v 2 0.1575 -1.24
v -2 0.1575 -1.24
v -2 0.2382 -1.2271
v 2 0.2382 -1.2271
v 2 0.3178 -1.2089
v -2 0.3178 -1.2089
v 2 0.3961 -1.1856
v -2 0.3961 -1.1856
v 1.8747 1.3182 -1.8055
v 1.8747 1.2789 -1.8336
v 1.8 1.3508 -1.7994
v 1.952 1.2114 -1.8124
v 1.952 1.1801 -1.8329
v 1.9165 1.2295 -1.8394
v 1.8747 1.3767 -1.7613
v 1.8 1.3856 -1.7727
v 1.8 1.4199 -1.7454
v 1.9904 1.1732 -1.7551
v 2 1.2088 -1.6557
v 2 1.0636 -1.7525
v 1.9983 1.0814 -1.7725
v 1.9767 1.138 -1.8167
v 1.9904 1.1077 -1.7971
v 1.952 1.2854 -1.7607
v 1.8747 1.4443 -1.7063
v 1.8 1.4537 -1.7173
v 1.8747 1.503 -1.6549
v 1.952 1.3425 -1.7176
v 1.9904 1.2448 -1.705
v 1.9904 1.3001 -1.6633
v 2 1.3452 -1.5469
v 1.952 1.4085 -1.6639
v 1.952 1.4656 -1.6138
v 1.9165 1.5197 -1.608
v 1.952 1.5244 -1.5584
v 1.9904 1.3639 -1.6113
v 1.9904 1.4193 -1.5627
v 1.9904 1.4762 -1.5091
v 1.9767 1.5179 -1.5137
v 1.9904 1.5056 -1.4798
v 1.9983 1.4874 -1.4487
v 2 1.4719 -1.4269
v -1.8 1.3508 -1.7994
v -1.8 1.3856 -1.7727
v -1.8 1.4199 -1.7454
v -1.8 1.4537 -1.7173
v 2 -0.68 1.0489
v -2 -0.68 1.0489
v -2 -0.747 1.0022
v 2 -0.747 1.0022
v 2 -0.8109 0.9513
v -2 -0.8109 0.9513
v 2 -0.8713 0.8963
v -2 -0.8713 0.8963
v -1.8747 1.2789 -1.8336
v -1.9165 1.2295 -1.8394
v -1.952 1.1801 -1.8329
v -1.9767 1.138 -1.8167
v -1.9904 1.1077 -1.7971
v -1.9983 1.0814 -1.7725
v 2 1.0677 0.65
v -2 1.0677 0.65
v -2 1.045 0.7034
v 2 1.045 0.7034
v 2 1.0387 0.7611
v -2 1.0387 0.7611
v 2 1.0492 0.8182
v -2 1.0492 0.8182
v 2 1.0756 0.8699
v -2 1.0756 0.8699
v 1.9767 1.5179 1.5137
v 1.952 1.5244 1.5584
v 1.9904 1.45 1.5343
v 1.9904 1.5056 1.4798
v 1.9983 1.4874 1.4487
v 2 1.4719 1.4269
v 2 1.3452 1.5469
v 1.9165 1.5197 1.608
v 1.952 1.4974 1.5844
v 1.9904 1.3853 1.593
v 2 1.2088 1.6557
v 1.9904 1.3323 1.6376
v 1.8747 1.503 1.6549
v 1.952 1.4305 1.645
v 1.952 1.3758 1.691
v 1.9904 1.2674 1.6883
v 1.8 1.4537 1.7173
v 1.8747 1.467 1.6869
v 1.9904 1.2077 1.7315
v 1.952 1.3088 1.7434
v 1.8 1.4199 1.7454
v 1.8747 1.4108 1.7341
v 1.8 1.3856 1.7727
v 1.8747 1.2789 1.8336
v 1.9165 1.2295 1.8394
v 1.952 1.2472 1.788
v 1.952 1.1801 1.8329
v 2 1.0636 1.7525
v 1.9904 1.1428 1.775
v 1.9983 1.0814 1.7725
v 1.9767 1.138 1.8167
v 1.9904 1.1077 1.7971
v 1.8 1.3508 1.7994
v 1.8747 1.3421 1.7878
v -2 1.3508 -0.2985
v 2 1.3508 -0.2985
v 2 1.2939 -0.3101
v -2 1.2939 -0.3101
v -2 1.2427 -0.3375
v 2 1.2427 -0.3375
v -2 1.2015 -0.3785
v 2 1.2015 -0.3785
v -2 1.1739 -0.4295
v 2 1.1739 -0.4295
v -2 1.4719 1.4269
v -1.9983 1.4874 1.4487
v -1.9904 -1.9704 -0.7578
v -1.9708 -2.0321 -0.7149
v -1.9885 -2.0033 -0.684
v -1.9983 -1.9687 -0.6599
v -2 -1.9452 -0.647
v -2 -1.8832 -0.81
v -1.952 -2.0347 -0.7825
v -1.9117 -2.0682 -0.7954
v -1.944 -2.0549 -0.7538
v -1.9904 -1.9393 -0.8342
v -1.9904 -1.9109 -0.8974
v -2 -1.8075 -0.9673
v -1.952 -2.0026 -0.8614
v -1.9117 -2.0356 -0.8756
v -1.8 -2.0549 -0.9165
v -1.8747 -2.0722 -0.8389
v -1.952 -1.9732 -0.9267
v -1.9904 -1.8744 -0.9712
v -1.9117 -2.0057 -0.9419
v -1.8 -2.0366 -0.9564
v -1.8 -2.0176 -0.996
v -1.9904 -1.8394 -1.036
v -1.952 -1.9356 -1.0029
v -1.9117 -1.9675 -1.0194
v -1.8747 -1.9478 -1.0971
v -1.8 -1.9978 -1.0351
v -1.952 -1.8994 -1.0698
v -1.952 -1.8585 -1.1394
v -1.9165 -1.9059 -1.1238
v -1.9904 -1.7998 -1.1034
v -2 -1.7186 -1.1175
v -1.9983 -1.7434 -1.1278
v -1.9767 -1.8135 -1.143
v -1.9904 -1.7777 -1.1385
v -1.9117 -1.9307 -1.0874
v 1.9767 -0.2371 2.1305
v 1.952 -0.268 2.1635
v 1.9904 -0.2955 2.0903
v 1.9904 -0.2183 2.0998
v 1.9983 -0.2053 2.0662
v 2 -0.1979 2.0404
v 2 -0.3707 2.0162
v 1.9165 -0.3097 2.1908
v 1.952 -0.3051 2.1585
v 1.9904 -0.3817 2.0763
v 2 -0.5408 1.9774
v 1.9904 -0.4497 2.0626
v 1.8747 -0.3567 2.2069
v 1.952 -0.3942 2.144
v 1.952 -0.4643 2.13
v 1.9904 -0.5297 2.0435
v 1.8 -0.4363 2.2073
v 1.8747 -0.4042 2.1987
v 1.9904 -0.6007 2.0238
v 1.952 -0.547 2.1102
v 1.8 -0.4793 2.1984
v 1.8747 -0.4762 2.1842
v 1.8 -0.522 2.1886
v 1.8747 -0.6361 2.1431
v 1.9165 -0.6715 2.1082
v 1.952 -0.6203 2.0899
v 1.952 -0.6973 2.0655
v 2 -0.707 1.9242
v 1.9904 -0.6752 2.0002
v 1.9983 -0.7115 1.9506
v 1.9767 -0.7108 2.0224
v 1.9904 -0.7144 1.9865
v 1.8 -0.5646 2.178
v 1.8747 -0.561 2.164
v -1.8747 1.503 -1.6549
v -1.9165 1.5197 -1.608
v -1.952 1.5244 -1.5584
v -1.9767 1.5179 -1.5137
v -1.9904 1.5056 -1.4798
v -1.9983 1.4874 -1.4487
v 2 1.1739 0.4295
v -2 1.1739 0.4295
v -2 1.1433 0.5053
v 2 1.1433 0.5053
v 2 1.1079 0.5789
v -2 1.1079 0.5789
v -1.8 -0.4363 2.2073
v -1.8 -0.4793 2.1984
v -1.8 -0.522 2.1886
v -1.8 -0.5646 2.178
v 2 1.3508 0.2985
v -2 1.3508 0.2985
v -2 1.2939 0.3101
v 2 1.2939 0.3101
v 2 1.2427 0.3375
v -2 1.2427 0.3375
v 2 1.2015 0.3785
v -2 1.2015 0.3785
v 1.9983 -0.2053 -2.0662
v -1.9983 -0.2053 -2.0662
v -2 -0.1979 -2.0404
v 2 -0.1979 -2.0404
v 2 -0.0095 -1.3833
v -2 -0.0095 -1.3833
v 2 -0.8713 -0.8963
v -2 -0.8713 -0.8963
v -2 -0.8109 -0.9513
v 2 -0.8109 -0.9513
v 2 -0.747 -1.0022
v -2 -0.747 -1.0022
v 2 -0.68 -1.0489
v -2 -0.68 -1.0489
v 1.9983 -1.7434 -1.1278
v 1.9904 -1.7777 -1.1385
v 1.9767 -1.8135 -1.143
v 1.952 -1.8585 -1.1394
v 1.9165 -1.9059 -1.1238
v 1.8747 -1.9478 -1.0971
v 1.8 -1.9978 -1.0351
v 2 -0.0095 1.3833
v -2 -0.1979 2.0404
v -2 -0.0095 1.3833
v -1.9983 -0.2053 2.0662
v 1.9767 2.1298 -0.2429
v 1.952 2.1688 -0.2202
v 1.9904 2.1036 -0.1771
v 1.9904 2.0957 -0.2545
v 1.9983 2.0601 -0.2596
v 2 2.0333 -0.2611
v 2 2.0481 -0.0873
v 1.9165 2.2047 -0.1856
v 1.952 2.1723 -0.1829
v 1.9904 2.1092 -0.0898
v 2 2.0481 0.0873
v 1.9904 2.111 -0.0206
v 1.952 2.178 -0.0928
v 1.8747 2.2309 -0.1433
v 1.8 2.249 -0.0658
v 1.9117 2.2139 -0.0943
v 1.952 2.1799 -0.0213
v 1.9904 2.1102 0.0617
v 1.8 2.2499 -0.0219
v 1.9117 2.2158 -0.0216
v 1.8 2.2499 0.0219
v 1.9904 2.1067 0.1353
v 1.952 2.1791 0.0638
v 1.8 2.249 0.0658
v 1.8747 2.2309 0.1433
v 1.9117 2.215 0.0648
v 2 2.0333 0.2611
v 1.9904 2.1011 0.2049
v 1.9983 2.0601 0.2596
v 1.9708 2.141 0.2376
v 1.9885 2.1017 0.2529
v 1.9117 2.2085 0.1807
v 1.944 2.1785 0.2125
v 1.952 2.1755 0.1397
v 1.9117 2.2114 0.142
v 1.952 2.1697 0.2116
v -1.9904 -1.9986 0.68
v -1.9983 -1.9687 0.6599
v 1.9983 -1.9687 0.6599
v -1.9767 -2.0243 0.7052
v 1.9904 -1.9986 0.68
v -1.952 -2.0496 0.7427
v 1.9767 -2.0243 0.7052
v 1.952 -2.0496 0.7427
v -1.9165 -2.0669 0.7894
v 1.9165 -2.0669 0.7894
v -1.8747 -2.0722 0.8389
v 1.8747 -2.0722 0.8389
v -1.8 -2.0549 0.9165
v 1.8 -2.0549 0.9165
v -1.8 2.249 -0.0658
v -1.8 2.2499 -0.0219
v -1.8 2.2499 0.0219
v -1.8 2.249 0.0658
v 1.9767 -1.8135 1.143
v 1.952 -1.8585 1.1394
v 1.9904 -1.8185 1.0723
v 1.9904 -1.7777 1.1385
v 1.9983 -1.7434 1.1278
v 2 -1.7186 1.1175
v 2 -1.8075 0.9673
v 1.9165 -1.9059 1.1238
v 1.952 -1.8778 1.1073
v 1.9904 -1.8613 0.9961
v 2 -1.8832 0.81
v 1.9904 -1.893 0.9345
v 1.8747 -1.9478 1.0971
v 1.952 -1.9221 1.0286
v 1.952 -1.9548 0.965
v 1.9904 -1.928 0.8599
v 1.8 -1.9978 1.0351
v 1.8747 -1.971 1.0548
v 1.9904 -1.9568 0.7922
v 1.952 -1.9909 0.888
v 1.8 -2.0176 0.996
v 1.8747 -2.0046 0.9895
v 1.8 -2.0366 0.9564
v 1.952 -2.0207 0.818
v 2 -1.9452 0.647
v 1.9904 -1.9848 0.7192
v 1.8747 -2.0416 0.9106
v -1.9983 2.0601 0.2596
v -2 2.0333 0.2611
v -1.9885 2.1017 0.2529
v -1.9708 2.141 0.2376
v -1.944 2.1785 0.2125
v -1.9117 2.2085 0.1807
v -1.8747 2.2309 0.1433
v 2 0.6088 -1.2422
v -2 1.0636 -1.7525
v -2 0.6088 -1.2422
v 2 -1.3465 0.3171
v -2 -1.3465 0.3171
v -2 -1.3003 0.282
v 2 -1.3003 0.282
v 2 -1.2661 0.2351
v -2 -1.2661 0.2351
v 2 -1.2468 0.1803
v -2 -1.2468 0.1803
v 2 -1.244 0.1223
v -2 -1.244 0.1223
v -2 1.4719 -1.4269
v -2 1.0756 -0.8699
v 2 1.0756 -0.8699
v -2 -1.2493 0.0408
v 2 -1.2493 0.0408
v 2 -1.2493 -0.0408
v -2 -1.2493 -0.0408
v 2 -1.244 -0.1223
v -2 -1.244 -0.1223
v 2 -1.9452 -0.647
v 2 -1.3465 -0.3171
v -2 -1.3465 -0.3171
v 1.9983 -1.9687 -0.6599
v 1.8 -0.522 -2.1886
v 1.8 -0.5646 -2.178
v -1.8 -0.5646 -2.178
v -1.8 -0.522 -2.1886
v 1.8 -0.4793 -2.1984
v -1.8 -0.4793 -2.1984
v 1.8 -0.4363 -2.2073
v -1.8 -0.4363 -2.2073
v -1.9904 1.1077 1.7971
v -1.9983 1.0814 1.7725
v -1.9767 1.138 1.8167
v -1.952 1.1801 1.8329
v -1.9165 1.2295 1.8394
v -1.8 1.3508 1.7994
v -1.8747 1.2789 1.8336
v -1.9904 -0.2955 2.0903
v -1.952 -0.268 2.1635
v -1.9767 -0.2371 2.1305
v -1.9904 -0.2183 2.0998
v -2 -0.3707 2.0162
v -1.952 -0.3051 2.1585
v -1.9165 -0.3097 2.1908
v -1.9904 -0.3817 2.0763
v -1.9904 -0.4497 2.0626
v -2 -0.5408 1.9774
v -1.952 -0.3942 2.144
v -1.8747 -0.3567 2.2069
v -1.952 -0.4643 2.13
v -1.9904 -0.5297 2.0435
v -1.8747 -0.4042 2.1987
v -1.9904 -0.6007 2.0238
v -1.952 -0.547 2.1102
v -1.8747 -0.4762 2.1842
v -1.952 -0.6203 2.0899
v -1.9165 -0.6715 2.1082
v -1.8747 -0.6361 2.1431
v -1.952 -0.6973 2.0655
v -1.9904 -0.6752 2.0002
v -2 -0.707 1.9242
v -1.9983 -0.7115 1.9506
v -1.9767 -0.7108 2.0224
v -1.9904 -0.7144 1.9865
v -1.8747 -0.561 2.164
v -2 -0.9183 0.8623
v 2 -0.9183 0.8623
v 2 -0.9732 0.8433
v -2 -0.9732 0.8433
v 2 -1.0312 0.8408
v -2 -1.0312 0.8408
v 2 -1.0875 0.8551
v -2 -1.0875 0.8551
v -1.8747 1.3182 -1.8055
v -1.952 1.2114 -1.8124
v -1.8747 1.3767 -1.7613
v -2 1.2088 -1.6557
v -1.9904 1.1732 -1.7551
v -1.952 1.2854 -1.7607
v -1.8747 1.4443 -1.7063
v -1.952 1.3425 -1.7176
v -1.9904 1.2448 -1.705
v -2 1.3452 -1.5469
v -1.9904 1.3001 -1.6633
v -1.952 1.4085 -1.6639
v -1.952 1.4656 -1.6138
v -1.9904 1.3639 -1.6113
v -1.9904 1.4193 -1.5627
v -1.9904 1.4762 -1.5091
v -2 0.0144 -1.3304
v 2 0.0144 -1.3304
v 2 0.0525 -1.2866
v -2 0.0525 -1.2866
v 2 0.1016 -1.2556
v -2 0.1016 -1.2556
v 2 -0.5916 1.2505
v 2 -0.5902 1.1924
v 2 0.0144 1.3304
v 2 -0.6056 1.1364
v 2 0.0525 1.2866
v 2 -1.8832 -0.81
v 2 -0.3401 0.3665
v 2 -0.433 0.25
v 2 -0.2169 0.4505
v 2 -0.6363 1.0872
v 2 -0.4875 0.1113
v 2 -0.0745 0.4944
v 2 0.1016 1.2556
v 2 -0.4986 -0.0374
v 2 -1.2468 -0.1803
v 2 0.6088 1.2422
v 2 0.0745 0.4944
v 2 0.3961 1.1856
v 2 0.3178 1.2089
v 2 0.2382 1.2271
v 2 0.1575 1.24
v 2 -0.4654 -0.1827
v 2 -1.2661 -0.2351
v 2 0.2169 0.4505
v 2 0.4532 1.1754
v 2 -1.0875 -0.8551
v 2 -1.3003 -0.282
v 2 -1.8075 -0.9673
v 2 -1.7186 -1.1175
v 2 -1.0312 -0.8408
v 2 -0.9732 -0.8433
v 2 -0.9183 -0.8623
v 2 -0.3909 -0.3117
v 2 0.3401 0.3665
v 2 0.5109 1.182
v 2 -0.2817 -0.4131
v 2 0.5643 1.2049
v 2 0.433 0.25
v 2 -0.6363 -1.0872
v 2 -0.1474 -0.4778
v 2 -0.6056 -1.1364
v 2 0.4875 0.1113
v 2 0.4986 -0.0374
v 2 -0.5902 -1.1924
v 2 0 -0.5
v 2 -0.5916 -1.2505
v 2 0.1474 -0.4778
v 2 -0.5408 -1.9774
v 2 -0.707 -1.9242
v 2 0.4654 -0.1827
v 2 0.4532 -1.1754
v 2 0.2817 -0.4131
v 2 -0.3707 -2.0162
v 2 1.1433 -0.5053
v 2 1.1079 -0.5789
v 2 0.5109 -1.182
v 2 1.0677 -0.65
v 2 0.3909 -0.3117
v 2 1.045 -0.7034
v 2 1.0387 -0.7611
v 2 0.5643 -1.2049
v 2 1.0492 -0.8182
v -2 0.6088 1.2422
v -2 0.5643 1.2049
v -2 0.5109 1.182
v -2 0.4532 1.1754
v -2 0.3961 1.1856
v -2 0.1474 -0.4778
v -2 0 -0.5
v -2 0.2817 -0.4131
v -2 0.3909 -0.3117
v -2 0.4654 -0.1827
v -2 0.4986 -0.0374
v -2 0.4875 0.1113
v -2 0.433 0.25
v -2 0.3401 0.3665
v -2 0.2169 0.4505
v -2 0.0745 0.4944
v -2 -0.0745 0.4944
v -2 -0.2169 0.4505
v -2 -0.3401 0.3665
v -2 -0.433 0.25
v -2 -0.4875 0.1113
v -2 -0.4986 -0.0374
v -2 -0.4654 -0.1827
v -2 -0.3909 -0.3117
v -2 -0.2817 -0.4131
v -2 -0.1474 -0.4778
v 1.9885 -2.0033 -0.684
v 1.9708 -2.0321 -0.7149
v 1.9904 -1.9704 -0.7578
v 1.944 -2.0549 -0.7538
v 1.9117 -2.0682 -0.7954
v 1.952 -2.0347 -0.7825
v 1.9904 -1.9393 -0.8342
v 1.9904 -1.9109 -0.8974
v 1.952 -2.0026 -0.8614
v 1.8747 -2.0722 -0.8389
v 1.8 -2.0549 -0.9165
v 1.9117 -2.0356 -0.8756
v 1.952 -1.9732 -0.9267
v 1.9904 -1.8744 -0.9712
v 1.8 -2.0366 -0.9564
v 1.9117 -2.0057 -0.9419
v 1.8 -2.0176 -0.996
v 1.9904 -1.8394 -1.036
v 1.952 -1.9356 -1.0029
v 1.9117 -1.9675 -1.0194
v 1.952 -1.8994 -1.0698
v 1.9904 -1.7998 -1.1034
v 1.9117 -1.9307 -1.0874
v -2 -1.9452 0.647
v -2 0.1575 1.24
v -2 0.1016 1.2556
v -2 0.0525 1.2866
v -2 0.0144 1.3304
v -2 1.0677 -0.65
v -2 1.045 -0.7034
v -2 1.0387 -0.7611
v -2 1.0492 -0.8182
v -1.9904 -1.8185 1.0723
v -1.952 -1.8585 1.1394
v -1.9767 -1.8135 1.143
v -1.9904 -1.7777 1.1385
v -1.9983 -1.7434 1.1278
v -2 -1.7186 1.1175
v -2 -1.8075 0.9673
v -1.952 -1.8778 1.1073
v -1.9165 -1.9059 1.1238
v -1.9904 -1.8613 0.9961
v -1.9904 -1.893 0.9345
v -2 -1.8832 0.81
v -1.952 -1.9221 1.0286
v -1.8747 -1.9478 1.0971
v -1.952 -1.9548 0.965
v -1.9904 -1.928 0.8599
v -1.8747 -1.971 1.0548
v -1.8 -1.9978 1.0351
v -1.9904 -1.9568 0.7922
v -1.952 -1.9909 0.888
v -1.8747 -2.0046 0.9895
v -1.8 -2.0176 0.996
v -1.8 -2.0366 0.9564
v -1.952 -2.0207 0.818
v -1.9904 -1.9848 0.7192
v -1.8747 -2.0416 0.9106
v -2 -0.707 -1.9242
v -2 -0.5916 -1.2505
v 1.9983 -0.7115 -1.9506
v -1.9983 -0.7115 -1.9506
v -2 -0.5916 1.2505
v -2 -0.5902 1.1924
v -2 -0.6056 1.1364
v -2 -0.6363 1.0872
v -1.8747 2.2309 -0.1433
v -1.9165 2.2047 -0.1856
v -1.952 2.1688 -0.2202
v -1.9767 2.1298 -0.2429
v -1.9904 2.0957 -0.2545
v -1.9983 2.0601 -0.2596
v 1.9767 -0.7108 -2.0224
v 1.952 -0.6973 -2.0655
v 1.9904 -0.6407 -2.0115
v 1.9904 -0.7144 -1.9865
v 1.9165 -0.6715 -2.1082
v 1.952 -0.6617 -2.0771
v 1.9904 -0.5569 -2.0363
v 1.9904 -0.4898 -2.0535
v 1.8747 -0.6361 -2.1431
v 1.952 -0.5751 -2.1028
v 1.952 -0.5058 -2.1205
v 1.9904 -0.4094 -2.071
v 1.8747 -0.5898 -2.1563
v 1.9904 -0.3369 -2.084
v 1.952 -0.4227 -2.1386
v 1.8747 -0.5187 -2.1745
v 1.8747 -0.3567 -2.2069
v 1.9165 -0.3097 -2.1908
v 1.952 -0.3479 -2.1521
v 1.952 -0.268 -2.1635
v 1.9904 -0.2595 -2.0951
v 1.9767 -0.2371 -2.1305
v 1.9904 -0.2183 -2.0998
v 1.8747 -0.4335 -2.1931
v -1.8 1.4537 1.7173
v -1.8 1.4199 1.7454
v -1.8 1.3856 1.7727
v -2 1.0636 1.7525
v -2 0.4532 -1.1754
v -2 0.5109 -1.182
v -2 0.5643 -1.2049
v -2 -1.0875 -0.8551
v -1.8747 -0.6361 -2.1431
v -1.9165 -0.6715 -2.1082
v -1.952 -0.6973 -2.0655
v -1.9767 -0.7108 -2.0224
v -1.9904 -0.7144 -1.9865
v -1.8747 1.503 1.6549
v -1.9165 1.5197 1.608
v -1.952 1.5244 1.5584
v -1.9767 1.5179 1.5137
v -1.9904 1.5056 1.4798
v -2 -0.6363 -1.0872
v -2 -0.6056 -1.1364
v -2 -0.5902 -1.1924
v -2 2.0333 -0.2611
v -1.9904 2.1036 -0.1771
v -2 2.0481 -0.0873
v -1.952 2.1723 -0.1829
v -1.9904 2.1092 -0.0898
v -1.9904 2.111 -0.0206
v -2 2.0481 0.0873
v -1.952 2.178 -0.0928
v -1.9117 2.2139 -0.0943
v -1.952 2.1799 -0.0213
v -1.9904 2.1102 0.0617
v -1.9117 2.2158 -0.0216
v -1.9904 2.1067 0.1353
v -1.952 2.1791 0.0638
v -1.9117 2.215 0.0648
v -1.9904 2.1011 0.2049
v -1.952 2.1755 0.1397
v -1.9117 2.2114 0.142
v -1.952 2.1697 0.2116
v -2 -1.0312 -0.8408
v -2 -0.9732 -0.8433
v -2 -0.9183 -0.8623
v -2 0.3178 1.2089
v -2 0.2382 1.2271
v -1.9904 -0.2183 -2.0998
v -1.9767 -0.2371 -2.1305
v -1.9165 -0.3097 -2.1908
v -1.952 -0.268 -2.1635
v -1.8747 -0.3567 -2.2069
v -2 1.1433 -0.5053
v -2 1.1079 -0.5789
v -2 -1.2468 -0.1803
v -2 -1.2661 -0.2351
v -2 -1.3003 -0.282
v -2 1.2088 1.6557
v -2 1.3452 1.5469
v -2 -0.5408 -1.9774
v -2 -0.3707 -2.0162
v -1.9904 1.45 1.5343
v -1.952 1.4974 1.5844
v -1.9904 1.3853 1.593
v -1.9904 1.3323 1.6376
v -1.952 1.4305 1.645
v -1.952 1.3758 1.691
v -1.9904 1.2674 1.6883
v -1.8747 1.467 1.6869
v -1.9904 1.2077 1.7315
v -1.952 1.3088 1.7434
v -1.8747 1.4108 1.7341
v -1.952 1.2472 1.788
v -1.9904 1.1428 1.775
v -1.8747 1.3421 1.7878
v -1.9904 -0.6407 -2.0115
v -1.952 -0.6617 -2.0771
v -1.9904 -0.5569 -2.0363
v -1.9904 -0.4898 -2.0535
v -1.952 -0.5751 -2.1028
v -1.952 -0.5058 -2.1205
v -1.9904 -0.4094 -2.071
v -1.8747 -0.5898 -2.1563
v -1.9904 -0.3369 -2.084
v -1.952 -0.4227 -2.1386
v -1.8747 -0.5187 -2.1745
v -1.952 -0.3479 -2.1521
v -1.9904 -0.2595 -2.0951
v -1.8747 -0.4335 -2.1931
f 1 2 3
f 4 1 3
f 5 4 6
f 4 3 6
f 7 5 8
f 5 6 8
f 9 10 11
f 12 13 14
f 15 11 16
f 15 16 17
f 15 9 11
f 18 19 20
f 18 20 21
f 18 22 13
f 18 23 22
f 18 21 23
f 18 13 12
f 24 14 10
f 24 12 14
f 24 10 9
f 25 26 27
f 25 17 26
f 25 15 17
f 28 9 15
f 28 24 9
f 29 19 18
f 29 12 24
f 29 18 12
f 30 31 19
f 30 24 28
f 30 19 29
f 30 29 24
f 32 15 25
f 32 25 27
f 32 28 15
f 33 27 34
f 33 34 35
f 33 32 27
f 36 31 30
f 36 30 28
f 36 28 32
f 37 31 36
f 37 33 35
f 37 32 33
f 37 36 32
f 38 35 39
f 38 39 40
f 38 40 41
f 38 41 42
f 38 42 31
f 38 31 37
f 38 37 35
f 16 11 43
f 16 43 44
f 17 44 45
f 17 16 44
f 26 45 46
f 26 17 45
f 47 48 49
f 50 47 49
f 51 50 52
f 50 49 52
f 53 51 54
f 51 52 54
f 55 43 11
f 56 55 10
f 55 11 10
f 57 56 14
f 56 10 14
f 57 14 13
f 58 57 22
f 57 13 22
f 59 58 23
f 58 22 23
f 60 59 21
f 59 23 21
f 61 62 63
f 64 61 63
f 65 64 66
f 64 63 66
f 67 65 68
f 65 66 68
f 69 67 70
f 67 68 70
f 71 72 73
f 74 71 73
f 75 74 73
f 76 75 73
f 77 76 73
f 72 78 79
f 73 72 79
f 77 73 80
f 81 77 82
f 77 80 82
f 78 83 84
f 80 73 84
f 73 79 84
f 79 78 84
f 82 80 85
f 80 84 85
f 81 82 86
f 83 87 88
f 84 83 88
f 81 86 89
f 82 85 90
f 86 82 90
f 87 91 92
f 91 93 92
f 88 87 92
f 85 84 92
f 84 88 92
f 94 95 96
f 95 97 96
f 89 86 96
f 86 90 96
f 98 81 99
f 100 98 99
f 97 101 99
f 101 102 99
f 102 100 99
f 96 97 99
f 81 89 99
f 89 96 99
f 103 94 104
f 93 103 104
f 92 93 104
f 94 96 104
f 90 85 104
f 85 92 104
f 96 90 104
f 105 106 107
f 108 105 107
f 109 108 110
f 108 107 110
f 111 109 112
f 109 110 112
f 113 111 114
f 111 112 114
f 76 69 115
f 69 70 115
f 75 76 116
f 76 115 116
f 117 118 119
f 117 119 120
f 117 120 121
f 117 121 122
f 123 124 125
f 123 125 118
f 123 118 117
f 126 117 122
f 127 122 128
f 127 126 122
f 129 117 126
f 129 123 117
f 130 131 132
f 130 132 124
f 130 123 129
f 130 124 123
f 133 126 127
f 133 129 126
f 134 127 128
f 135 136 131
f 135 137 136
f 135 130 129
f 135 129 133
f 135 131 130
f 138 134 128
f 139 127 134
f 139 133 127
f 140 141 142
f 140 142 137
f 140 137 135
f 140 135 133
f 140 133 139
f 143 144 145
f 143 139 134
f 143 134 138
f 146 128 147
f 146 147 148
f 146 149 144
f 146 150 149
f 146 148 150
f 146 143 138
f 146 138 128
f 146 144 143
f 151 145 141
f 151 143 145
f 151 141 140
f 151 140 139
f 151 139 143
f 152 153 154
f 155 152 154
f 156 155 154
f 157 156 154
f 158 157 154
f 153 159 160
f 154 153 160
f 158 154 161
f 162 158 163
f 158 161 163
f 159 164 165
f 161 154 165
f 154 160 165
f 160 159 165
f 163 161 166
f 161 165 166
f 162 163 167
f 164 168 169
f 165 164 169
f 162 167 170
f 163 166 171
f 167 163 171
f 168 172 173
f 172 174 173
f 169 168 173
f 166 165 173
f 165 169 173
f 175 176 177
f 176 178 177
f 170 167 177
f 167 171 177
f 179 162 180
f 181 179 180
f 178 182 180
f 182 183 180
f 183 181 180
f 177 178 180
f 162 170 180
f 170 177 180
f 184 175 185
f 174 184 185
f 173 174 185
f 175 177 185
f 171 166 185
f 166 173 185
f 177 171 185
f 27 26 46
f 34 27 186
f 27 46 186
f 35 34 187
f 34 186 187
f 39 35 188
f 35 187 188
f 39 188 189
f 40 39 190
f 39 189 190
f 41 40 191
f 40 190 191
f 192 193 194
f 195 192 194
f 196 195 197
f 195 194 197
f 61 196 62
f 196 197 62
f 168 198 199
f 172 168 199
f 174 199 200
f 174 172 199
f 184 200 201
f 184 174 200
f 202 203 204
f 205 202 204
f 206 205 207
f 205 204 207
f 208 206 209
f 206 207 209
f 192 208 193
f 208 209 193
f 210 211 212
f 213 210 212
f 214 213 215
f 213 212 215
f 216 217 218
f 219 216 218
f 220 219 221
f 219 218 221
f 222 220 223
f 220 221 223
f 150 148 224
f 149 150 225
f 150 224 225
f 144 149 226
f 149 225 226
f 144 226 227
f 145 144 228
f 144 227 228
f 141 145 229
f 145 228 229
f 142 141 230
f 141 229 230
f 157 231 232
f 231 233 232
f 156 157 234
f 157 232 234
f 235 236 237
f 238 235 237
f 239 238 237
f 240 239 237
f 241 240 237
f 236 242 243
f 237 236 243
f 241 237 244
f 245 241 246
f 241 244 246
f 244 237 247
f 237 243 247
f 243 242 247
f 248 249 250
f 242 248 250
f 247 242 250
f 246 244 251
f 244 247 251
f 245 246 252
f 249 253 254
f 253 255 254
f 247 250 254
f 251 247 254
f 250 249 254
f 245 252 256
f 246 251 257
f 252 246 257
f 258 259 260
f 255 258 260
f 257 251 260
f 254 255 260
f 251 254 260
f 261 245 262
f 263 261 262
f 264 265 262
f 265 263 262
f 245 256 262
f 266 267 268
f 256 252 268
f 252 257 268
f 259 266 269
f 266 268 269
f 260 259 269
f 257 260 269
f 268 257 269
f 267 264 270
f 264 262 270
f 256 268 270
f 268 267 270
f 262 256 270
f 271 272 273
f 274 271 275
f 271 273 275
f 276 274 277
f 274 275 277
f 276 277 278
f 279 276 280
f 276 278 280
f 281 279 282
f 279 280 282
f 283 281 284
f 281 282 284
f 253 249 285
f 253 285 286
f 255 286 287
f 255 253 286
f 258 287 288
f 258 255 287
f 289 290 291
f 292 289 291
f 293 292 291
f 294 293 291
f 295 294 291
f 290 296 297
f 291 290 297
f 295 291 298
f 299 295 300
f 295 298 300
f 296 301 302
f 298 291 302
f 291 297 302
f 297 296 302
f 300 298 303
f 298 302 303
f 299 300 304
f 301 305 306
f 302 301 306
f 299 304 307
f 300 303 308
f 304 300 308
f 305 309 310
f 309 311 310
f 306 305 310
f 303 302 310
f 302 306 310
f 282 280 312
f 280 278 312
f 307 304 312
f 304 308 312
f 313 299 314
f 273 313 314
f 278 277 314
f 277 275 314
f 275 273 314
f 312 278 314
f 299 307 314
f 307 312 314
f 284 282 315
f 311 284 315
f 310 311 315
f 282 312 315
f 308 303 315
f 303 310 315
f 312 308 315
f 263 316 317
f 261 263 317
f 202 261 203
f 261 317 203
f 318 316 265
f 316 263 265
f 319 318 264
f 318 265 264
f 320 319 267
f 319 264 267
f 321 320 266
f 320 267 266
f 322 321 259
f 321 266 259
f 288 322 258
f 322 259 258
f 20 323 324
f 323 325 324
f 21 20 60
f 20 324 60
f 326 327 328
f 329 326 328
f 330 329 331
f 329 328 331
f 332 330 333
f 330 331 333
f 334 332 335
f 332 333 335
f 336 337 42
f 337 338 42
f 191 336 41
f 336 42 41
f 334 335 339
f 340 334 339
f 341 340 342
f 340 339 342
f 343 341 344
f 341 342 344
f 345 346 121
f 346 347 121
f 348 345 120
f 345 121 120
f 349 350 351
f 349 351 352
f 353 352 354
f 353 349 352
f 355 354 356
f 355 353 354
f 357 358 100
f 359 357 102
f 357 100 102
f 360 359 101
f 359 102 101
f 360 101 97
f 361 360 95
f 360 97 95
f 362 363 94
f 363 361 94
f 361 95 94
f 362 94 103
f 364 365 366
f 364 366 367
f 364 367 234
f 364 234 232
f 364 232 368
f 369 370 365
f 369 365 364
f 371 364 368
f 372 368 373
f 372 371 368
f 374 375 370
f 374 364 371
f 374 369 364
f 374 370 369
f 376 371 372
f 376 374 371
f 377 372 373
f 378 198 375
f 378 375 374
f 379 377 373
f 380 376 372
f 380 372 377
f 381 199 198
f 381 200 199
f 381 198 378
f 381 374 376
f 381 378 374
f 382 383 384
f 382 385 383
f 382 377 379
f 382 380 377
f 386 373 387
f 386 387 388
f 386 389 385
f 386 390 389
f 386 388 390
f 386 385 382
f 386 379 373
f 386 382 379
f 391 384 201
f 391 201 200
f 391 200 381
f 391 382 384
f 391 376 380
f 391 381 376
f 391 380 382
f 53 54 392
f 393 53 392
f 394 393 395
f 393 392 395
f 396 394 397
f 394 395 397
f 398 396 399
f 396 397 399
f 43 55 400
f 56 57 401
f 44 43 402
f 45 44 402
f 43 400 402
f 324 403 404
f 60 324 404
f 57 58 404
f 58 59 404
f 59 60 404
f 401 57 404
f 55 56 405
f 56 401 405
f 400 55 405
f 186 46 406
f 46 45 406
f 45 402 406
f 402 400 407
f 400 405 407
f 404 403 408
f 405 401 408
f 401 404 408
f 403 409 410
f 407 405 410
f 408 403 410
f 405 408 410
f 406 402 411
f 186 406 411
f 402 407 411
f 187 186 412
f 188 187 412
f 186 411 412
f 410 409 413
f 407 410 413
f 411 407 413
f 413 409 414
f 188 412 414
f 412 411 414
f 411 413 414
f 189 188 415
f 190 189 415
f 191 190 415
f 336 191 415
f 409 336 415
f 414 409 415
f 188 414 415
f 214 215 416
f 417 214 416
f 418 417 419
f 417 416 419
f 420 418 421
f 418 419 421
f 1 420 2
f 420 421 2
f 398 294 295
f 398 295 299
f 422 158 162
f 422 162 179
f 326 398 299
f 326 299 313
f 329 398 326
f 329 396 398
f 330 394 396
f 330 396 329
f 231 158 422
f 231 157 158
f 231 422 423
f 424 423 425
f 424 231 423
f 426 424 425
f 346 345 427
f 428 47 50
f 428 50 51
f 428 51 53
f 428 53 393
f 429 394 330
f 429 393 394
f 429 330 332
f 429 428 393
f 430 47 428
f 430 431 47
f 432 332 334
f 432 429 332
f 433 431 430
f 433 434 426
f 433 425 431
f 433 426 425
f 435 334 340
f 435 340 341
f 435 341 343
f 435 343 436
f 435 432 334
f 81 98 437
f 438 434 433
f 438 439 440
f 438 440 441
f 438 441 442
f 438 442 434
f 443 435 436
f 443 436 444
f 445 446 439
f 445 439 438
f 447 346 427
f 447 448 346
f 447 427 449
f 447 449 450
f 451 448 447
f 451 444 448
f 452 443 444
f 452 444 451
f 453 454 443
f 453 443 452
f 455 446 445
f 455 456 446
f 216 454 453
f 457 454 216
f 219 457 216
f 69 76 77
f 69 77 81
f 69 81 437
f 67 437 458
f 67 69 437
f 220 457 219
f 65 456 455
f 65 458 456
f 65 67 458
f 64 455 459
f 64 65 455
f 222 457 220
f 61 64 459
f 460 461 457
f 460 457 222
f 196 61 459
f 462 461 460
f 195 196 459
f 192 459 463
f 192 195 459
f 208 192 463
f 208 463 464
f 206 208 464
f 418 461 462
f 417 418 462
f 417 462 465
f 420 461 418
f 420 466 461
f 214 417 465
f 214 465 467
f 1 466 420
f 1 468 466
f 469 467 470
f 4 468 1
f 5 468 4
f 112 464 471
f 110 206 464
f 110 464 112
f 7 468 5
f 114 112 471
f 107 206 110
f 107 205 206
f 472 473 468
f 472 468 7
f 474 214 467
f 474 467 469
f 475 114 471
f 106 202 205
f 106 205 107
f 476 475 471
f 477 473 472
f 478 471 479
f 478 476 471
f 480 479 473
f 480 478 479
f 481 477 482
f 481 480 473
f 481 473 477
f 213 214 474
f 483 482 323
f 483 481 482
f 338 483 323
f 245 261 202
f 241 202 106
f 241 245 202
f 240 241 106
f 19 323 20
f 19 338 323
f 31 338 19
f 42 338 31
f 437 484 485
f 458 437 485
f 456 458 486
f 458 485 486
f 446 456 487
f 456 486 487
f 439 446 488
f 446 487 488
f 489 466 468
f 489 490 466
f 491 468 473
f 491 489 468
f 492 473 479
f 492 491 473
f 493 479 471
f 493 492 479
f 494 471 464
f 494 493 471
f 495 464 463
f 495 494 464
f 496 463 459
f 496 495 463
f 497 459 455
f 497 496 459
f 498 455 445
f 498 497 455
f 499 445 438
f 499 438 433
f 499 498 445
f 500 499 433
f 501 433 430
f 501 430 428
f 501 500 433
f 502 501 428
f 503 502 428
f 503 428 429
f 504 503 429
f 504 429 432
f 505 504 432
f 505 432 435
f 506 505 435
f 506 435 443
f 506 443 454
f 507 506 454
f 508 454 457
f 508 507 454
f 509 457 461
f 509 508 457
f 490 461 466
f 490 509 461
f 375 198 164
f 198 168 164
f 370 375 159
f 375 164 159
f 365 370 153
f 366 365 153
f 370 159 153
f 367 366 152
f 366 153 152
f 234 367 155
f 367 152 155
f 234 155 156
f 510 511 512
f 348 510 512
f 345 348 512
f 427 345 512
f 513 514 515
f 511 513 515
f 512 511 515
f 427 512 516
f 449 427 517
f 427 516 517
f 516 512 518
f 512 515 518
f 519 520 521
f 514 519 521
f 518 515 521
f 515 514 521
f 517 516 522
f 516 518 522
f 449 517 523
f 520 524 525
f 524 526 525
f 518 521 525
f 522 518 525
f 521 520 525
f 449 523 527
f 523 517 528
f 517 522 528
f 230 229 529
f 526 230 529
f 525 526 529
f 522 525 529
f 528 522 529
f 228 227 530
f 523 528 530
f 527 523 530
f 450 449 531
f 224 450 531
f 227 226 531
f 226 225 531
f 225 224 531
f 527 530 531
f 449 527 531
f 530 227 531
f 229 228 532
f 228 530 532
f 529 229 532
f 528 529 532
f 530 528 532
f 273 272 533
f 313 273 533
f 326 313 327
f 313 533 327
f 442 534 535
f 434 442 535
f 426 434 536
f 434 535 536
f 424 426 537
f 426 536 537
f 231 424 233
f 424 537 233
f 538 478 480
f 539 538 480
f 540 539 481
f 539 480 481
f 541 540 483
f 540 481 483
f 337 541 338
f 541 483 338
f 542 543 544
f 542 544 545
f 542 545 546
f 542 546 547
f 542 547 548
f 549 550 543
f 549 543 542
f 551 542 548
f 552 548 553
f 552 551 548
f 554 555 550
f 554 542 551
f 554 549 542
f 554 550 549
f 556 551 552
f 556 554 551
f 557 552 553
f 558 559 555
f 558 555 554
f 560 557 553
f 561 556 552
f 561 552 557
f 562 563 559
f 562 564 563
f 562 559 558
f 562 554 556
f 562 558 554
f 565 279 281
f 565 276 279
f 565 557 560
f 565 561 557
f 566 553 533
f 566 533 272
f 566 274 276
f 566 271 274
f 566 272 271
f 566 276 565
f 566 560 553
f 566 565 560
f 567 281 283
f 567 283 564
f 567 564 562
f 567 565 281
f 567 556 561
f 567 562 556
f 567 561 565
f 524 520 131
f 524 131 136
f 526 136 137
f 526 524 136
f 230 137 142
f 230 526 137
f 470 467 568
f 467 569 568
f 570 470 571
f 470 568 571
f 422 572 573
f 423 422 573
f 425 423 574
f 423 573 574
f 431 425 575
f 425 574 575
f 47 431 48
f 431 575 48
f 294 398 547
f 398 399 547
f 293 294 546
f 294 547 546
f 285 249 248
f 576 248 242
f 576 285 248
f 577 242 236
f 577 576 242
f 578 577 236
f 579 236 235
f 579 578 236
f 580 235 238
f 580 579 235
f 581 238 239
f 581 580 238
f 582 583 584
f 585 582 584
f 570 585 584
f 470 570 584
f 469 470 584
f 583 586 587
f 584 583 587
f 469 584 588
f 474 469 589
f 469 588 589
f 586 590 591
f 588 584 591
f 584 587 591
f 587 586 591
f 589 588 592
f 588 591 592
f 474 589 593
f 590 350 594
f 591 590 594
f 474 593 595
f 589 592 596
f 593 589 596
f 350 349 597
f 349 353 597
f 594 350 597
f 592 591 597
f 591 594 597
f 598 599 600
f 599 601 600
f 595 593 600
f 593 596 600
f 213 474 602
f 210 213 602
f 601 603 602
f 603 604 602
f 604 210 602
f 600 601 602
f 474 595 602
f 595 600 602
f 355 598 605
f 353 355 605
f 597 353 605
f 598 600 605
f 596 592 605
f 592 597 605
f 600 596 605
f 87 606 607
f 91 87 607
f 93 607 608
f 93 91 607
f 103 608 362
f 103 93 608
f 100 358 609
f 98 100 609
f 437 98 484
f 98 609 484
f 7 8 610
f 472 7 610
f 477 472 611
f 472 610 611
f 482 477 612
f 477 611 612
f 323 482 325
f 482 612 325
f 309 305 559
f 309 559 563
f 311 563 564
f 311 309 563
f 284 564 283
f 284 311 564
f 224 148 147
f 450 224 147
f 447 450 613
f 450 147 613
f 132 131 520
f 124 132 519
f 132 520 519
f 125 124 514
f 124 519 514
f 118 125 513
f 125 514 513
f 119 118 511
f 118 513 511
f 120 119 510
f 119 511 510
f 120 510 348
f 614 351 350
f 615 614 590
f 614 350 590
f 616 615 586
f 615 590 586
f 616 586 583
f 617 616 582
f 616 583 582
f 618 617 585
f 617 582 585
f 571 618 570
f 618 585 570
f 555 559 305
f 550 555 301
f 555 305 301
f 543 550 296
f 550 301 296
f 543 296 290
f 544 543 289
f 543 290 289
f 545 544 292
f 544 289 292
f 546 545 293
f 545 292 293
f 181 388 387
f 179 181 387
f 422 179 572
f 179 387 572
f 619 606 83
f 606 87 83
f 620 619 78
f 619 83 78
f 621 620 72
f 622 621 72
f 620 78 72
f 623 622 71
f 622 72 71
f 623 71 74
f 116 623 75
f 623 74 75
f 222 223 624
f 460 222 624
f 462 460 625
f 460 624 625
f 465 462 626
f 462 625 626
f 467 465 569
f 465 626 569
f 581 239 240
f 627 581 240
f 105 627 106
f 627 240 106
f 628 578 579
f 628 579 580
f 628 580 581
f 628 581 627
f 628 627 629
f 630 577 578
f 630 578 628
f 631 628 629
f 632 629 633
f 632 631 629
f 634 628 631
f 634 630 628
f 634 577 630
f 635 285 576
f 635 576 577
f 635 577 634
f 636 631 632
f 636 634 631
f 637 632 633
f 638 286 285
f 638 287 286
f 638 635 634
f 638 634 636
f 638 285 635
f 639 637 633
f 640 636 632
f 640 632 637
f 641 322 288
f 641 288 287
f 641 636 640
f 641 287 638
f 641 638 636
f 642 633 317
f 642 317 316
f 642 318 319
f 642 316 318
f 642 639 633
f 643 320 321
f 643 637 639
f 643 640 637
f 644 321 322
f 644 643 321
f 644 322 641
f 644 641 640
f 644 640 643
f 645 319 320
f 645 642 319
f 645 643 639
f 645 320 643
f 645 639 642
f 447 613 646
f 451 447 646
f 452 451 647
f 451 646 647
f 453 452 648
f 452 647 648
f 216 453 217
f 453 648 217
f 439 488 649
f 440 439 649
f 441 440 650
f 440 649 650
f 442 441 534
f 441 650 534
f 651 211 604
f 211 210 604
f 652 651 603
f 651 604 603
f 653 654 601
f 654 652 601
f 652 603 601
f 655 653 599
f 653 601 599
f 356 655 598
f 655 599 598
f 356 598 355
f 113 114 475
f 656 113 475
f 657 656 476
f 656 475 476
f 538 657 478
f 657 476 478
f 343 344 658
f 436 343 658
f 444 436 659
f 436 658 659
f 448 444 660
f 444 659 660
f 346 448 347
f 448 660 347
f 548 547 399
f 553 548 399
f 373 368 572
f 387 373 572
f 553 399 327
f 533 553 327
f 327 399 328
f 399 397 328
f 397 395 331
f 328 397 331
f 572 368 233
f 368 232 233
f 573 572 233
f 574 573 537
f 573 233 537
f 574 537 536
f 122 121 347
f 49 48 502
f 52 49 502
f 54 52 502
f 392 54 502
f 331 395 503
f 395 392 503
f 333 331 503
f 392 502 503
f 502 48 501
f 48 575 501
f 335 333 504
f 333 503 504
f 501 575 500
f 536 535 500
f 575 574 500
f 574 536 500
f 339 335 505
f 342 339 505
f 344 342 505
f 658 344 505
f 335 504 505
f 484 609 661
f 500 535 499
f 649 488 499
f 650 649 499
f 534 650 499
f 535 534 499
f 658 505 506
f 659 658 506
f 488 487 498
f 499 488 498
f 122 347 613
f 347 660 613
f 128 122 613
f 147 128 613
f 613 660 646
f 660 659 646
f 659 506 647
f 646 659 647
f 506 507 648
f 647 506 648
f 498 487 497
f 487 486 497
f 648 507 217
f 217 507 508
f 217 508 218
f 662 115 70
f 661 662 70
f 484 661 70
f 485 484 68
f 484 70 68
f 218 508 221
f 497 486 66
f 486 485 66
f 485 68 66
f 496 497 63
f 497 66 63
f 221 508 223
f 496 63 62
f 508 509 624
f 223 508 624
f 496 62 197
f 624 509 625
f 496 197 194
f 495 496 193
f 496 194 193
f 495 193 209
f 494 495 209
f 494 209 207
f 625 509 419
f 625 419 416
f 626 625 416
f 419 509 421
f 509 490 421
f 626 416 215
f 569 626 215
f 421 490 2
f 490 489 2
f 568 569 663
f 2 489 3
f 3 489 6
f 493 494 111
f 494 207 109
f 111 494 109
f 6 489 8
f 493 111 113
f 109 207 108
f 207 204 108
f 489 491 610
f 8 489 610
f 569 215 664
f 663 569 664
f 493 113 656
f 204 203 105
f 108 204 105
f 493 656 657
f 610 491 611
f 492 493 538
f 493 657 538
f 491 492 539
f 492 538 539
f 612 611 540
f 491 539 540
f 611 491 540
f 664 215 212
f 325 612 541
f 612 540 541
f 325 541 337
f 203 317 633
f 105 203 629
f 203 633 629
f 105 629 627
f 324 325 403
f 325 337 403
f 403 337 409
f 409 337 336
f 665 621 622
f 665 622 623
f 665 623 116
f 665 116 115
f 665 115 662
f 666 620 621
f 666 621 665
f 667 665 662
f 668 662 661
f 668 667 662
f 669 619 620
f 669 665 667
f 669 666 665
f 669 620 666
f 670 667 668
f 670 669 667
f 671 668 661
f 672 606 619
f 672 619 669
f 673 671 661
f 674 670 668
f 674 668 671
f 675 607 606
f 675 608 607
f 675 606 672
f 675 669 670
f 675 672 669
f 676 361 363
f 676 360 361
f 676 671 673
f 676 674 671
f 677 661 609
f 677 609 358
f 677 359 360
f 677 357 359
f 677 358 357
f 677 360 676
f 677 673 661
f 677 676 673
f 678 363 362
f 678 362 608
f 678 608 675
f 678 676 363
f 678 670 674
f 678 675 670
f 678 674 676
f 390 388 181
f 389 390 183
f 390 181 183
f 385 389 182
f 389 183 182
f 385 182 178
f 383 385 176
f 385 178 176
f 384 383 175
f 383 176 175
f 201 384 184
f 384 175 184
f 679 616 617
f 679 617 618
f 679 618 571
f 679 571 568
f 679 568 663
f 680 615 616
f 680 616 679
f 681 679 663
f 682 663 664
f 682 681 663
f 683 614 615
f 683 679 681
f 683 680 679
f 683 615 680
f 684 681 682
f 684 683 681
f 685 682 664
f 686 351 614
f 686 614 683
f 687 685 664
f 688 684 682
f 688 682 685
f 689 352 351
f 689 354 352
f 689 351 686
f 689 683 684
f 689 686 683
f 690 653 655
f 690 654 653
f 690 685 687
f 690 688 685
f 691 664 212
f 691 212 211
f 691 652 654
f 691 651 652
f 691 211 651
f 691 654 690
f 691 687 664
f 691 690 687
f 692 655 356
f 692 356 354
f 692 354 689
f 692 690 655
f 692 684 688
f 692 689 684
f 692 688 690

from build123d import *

# Parameters (mm, degrees)
SKETCH3_R           = 2.25
SKETCH3_R_2         = 0.5
BOSS_EXTRUDE1_DEPTH = 2
CUT_EXTRUDE2_DEPTH  = 2
FILLET1_R           = 0.2


with BuildPart() as part:
    # Sketch3 → Boss-Extrude1 (new body, symmetric)
    with BuildSketch(Plane(origin=(0, 0, 0), x_dir=(0, 0, -1), z_dir=(1, 0, 0))):
        Circle(SKETCH3_R)
        Circle(SKETCH3_R_2, mode=Mode.SUBTRACT)
    extrude(amount=BOSS_EXTRUDE1_DEPTH, both=True)

    # Sketch4 → Cut-Extrude2 (cut, symmetric)
    with BuildSketch(Plane(origin=(0, 0, 0), x_dir=(0, 0, -1), z_dir=(1, 0, 0))):
        with BuildLine():
            Line((2.235635318, -0.253839957), (1.383325928, -0.009515205))
            ThreePointArc((1.383325928, -0.009515205), (1.286634966, 0.052527484), (1.240033271, 0.157535672))
            ThreePointArc((1.240033271, 0.157535672), (1.21865989, 0.278151167), (1.185583538, 0.396095536))
            ThreePointArc((1.185583538, 0.396095536), (1.18200887, 0.510924362), (1.242205103, 0.60877553))
            Line((1.242205103, 0.60877553), (1.904100792, 1.19870771))
            ThreePointArc((1.904100792, 1.19870771), (2.193587802, 0.500672101), (2.235635318, -0.253839957))
        make_face()
        with BuildLine():
            Line((1.195435752, -1.906156699), (0.855050322, -1.087460395))
            ThreePointArc((0.855050322, -1.087460395), (0.843271421, -0.973181372), (0.896314446, -0.871275165))
            ThreePointArc((0.896314446, -0.871275165), (0.977289353, -0.779362252), (1.048879206, -0.679965008))
            ThreePointArc((1.048879206, -0.679965008), (1.136427227, -0.605575618), (1.250462088, -0.591629723))
            Line((1.250462088, -0.591629723), (2.124374851, -0.741303913))
            ThreePointArc((2.124374851, -0.741303913), (1.759120836, -1.402852054), (1.195435752, -1.906156699))
        make_face()
        with BuildLine():
            Line((-0.744951318, -2.123098569), (-0.317095616, -1.346525727))
            ThreePointArc((-0.317095616, -1.346525727), (-0.235092704, -1.266064806), (-0.122347438, -1.243998032))
            ThreePointArc((-0.122347438, -1.243998032), (0, -1.25), (0.122347438, -1.243998032))
            ThreePointArc((0.122347438, -1.243998032), (0.235092704, -1.266064806), (0.317095616, -1.346525727))
            Line((0.317095616, -1.346525727), (0.744951318, -2.123098569))
            ThreePointArc((0.744951318, -2.123098569), (0, -2.25), (-0.744951318, -2.123098569))
        make_face()
        with BuildLine():
            Line((-2.124374851, -0.741303913), (-1.250462088, -0.591629723))
            ThreePointArc((-1.250462088, -0.591629723), (-1.136427227, -0.605575618), (-1.048879206, -0.679965008))
            ThreePointArc((-1.048879206, -0.679965008), (-0.977289353, -0.779362252), (-0.896314446, -0.871275165))
            ThreePointArc((-0.896314446, -0.871275165), (-0.843271421, -0.973181372), (-0.855050322, -1.087460395))
            Line((-0.855050322, -1.087460395), (-1.195435752, -1.906156699))
            ThreePointArc((-1.195435752, -1.906156699), (-1.759120836, -1.402852054), (-2.124374851, -0.741303913))
        make_face()
        with BuildLine():
            Line((-1.904100792, 1.19870771), (-1.242205103, 0.60877553))
            ThreePointArc((-1.242205103, 0.60877553), (-1.18200887, 0.510924362), (-1.185583538, 0.396095536))
            ThreePointArc((-1.185583538, 0.396095536), (-1.21865989, 0.278151167), (-1.240033271, 0.157535672))
            ThreePointArc((-1.240033271, 0.157535672), (-1.286634966, 0.052527484), (-1.383325928, -0.009515205))
            Line((-1.383325928, -0.009515205), (-2.235635318, -0.253839957))
            ThreePointArc((-2.235635318, -0.253839957), (-2.193587802, 0.500672101), (-1.904100792, 1.19870771))
        make_face()
        with BuildLine():
            Line((-0.25, 2.236067977), (-0.298542339, 1.350760392))
            ThreePointArc((-0.298542339, 1.350760392), (-0.337513725, 1.242687876), (-0.429519285, 1.173888063))
            ThreePointArc((-0.429519285, 1.173888063), (-0.542354674, 1.126211085), (-0.64998175, 1.067718935))
            ThreePointArc((-0.64998175, 1.067718935), (-0.761136139, 1.038682073), (-0.869928896, 1.075595128))
            Line((-0.869928896, 1.075595128), (-1.592355891, 1.589623451))
            ThreePointArc((-1.592355891, 1.589623451), (-0.976238413, 2.027179953), (-0.25, 2.236067977))
        make_face()
        with BuildLine():
            Line((0.25, 2.236067977), (0.298542339, 1.350760392))
            ThreePointArc((0.298542339, 1.350760392), (0.337513725, 1.242687876), (0.429519285, 1.173888063))
            ThreePointArc((0.429519285, 1.173888063), (0.542354674, 1.126211085), (0.64998175, 1.067718935))
            ThreePointArc((0.64998175, 1.067718935), (0.761136139, 1.038682073), (0.869928896, 1.075595128))
            Line((0.869928896, 1.075595128), (1.592355891, 1.589623451))
            ThreePointArc((1.592355891, 1.589623451), (0.976238413, 2.027179953), (0.25, 2.236067977))
        make_face()
    extrude(amount=CUT_EXTRUDE2_DEPTH, both=True, mode=Mode.SUBTRACT)

    # Fillet1
    fillet1_edges = [part.edges().sort_by_distance(p)[0] for p in [
        (2, 2.25, 0),
        (2, 1.402852054, 1.759120836),
        (0, 2.236067977, -0.25),
        (0, 1.589623451, -1.592355891),
        (2, -0.500672101, 2.193587802),
        (2, -2.027179953, 0.976238413),
        (2, -2.027179953, -0.976238413),
        (2, -0.500672101, -2.193587802),
        (-2, 2.25, 0),
        (-2, 1.402852054, 1.759120836),
        (-2, -0.500672101, 2.193587802),
        (-2, -2.027179953, 0.976238413),
        (-2, -2.027179953, -0.976238413),
        (-2, -0.500672101, -2.193587802),
        (-2, 1.402852054, -1.759120836),
        (2, 1.402852054, -1.759120836),
        (0, 1.19870771, -1.904100792),
        (0, -0.253839957, -2.235635318),
        (0, -0.741303913, -2.124374851),
        (0, -1.906156699, -1.195435752),
        (0, -2.123098569, -0.744951318),
        (0, -2.123098569, 0.744951318),
        (0, -1.906156699, 1.195435752),
        (0, -0.741303913, 2.124374851),
        (0, 1.589623451, 1.592355891),
        (0, 2.236067977, 0.25),
        (0, -0.253839957, 2.235635318),
        (0, 1.19870771, 1.904100792),
    ]]
    fillet(fillet1_edges, radius=FILLET1_R)


solid = part.part
